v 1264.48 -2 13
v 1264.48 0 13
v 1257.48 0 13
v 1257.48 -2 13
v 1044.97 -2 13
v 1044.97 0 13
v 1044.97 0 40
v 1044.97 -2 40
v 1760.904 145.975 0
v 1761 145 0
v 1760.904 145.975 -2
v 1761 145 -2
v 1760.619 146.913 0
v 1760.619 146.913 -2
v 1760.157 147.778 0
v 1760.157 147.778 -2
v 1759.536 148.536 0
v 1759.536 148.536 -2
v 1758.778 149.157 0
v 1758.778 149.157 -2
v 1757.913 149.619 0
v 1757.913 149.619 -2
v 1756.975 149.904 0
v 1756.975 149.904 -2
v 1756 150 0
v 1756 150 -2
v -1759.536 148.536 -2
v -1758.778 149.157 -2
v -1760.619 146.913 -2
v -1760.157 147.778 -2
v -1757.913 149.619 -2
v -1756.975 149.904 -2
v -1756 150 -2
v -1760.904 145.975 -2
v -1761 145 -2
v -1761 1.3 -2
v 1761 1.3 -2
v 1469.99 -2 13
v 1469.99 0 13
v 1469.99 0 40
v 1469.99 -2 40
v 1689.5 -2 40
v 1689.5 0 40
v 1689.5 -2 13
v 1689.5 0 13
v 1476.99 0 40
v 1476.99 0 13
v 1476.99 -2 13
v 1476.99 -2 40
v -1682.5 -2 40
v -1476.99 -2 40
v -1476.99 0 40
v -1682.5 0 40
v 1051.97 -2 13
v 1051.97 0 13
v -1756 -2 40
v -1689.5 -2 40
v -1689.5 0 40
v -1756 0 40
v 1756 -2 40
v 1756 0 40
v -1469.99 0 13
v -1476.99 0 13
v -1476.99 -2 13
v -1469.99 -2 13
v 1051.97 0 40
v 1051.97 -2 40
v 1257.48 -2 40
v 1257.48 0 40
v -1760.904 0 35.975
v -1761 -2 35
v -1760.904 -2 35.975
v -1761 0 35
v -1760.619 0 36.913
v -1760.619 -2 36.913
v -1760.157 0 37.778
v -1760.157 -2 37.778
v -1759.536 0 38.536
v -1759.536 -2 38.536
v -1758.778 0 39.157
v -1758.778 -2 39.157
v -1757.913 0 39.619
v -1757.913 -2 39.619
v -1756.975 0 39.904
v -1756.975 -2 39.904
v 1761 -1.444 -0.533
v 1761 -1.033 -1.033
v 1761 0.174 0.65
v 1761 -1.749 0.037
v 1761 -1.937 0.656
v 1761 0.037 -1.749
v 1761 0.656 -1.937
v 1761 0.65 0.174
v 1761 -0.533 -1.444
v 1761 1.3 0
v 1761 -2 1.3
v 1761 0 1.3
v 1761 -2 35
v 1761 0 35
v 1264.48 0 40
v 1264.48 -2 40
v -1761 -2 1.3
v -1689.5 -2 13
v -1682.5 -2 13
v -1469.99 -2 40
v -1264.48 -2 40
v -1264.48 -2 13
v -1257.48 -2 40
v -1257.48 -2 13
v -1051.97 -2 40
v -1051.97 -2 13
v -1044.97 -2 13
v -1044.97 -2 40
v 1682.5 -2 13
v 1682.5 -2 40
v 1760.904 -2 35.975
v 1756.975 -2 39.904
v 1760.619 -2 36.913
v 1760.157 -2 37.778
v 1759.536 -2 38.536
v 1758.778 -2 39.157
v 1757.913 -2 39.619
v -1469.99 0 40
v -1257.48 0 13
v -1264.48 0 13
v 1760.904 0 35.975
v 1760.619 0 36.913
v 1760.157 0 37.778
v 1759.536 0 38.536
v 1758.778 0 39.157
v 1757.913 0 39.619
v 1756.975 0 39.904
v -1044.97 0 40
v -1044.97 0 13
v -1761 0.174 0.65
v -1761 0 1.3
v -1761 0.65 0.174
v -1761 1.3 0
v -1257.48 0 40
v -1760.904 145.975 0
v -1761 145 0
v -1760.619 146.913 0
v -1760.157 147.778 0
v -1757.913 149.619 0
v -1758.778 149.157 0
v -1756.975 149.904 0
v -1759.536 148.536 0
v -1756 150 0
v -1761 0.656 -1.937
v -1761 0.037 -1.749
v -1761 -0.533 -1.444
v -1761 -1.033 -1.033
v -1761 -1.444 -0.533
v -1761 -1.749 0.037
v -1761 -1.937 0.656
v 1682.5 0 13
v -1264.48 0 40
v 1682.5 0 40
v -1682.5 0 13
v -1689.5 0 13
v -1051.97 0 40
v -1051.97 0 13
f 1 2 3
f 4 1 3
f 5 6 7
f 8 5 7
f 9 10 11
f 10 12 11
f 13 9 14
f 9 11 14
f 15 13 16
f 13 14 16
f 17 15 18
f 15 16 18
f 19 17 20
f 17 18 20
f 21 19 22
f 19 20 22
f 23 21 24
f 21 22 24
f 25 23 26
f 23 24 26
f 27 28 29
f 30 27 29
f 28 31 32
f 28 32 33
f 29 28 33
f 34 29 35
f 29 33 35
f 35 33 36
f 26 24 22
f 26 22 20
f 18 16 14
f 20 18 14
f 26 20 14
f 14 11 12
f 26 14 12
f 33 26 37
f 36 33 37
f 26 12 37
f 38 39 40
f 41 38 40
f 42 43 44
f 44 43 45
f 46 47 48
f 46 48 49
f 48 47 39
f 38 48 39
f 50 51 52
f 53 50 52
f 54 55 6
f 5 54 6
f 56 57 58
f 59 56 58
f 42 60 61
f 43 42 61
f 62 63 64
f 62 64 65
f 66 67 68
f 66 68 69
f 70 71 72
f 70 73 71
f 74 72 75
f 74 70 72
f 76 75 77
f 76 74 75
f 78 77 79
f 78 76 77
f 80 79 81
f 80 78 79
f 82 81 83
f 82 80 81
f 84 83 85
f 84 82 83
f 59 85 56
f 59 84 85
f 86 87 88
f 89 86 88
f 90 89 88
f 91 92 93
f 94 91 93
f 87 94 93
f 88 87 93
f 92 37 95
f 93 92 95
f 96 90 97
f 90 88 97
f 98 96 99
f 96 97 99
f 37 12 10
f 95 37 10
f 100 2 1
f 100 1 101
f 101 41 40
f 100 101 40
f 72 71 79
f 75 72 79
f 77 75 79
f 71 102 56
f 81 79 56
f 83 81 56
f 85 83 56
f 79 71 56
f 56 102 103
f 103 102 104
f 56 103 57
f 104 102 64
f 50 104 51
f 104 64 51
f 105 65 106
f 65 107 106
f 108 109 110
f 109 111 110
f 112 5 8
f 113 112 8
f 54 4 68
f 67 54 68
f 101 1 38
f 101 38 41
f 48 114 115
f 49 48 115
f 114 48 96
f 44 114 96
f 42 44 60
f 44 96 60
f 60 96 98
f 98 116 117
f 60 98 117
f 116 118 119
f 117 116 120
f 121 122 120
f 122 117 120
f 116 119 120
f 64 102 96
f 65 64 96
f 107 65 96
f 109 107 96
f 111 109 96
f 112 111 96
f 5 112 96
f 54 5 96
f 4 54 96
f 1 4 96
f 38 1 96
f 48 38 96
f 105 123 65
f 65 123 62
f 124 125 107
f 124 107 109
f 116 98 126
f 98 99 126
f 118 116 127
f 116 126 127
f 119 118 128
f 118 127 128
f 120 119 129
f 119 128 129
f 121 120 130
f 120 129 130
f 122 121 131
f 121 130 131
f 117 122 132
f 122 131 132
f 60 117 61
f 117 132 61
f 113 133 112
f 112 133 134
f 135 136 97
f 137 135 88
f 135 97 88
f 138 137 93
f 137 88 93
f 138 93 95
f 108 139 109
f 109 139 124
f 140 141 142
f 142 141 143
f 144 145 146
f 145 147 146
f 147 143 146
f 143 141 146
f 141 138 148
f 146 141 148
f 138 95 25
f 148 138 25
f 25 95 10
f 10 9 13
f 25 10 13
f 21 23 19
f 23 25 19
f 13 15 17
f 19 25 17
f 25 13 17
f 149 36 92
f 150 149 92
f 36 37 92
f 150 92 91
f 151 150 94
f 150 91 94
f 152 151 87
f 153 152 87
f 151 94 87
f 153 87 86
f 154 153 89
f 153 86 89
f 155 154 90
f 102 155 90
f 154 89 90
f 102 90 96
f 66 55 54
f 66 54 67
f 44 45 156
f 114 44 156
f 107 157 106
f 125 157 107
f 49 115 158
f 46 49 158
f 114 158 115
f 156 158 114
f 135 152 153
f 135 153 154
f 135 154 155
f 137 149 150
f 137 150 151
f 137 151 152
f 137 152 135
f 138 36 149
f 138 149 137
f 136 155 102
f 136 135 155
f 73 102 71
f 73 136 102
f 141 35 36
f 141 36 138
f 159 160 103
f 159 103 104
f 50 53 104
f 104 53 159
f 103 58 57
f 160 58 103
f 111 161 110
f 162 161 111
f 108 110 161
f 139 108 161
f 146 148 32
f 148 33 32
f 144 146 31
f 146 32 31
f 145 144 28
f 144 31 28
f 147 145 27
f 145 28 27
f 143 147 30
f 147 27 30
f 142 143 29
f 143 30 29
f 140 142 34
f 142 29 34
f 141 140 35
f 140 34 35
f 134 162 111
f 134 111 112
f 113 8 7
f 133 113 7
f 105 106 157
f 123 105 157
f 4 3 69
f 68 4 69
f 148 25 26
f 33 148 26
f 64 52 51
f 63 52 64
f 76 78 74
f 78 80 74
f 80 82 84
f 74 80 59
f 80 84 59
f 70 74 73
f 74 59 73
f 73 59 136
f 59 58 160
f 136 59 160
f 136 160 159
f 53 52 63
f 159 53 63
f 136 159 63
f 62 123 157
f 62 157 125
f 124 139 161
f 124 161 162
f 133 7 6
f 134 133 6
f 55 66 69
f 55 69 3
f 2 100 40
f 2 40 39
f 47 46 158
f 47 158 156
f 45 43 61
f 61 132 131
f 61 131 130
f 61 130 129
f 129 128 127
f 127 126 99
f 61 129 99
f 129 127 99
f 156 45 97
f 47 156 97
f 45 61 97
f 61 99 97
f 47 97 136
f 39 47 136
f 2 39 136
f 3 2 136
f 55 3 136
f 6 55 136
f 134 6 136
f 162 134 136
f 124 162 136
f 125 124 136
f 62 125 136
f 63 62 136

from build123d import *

# Parameters (mm, degrees)
BASE_FLANGE1_DEPTH       = 1761
FILLET1_R                = 5
SKETCH2_W                = 7
SKETCH2_H                = 35
CUT_EXTRUDE1_DEPTH       = 10
PATTERN_LINEAR_1_COUNT   = 4
PATTERN_LINEAR_1_PITCH   = 212.51
MIRROR_1_COPY_1_SKETCH_W = 7
MIRROR_1_COPY_1_SKETCH_H = 35
MIRROR_1_COPY_1_DEPTH    = 10
MIRROR_1_COPY_2_SKETCH_W = 7
MIRROR_1_COPY_2_SKETCH_H = 35
MIRROR_1_COPY_2_DEPTH    = 10
MIRROR_1_COPY_3_SKETCH_W = 7
MIRROR_1_COPY_3_SKETCH_H = 35
MIRROR_1_COPY_3_DEPTH    = 10


# Sheet-metal steps are written as plain solids
with BuildPart() as part:
    # Sketch1 → Base-Flange1 (new, symmetric)
    with BuildSketch(Plane(origin=(0, 0, 0), x_dir=(0, 0, -1), z_dir=(1, 0, 0))):
        with BuildLine():
            Line((-40, 0), (-1.3, 0))
            ThreePointArc((-1.3, 0), (-0.380761184, 0.380761184), (0, 1.3))
            Line((0, 1.3), (0, 150))
            Line((0, 150), (2, 150))
            Line((2, 150), (2, 1.3))
            ThreePointArc((2, 1.3), (1.033452378, -1.033452378), (-1.3, -2))
            Line((-1.3, -2), (-40, -2))
            Line((-40, -2), (-40, 0))
        make_face()
    extrude(amount=BASE_FLANGE1_DEPTH, both=True)

    # Fillet1
    fillet1_edges = [part.edges().sort_by_distance(p)[0] for p in [
        (1761, -1, 40),
        (-1761, -1, 40),
        (1761, 150, -1),
        (-1761, 150, -1),
    ]]
    fillet(fillet1_edges, radius=FILLET1_R)

    # Sketch2 → Cut-Extrude1 (cut)
    with BuildSketch(Plane(origin=(0, 0, 0), x_dir=(1, 0, 0), z_dir=(0, 1, 0))):
        with Locations((-1686, -30.5)):
            Rectangle(SKETCH2_W, SKETCH2_H)
    cut_extrude1 = extrude(amount=-CUT_EXTRUDE1_DEPTH, mode=Mode.SUBTRACT)

    # 阵列(线性)1: Cut-Extrude1 ×4
    with Locations(*[(i * PATTERN_LINEAR_1_PITCH, 0, 0) for i in range(1, PATTERN_LINEAR_1_COUNT)]):
        add(cut_extrude1, mode=Mode.SUBTRACT)

    # 镜向1: Cut-Extrude1 across plane
    add(cut_extrude1.mirror(Plane.ZY), mode=Mode.SUBTRACT)

    # 镜向1 copy 1 sketch → 镜向1 copy 1 (cut)
    with BuildSketch(Plane(origin=(-212.51, 0, 0), x_dir=(-1, 0, 0), z_dir=(0, 1, 0))):
        with Locations((-1686, 30.5)):
            Rectangle(MIRROR_1_COPY_1_SKETCH_W, MIRROR_1_COPY_1_SKETCH_H)
    extrude(amount=-MIRROR_1_COPY_1_DEPTH, mode=Mode.SUBTRACT)

    # 镜向1 copy 2 sketch → 镜向1 copy 2 (cut)
    with BuildSketch(Plane(origin=(-425.02, 0, 0), x_dir=(-1, 0, 0), z_dir=(0, 1, 0))):
        with Locations((-1686, 30.5)):
            Rectangle(MIRROR_1_COPY_2_SKETCH_W, MIRROR_1_COPY_2_SKETCH_H)
    extrude(amount=-MIRROR_1_COPY_2_DEPTH, mode=Mode.SUBTRACT)

    # 镜向1 copy 3 sketch → 镜向1 copy 3 (cut)
    with BuildSketch(Plane(origin=(-637.53, 0, 0), x_dir=(-1, 0, 0), z_dir=(0, 1, 0))):
        with Locations((-1686, 30.5)):
            Rectangle(MIRROR_1_COPY_3_SKETCH_W, MIRROR_1_COPY_3_SKETCH_H)
    extrude(amount=-MIRROR_1_COPY_3_DEPTH, mode=Mode.SUBTRACT)


solid = part.part
